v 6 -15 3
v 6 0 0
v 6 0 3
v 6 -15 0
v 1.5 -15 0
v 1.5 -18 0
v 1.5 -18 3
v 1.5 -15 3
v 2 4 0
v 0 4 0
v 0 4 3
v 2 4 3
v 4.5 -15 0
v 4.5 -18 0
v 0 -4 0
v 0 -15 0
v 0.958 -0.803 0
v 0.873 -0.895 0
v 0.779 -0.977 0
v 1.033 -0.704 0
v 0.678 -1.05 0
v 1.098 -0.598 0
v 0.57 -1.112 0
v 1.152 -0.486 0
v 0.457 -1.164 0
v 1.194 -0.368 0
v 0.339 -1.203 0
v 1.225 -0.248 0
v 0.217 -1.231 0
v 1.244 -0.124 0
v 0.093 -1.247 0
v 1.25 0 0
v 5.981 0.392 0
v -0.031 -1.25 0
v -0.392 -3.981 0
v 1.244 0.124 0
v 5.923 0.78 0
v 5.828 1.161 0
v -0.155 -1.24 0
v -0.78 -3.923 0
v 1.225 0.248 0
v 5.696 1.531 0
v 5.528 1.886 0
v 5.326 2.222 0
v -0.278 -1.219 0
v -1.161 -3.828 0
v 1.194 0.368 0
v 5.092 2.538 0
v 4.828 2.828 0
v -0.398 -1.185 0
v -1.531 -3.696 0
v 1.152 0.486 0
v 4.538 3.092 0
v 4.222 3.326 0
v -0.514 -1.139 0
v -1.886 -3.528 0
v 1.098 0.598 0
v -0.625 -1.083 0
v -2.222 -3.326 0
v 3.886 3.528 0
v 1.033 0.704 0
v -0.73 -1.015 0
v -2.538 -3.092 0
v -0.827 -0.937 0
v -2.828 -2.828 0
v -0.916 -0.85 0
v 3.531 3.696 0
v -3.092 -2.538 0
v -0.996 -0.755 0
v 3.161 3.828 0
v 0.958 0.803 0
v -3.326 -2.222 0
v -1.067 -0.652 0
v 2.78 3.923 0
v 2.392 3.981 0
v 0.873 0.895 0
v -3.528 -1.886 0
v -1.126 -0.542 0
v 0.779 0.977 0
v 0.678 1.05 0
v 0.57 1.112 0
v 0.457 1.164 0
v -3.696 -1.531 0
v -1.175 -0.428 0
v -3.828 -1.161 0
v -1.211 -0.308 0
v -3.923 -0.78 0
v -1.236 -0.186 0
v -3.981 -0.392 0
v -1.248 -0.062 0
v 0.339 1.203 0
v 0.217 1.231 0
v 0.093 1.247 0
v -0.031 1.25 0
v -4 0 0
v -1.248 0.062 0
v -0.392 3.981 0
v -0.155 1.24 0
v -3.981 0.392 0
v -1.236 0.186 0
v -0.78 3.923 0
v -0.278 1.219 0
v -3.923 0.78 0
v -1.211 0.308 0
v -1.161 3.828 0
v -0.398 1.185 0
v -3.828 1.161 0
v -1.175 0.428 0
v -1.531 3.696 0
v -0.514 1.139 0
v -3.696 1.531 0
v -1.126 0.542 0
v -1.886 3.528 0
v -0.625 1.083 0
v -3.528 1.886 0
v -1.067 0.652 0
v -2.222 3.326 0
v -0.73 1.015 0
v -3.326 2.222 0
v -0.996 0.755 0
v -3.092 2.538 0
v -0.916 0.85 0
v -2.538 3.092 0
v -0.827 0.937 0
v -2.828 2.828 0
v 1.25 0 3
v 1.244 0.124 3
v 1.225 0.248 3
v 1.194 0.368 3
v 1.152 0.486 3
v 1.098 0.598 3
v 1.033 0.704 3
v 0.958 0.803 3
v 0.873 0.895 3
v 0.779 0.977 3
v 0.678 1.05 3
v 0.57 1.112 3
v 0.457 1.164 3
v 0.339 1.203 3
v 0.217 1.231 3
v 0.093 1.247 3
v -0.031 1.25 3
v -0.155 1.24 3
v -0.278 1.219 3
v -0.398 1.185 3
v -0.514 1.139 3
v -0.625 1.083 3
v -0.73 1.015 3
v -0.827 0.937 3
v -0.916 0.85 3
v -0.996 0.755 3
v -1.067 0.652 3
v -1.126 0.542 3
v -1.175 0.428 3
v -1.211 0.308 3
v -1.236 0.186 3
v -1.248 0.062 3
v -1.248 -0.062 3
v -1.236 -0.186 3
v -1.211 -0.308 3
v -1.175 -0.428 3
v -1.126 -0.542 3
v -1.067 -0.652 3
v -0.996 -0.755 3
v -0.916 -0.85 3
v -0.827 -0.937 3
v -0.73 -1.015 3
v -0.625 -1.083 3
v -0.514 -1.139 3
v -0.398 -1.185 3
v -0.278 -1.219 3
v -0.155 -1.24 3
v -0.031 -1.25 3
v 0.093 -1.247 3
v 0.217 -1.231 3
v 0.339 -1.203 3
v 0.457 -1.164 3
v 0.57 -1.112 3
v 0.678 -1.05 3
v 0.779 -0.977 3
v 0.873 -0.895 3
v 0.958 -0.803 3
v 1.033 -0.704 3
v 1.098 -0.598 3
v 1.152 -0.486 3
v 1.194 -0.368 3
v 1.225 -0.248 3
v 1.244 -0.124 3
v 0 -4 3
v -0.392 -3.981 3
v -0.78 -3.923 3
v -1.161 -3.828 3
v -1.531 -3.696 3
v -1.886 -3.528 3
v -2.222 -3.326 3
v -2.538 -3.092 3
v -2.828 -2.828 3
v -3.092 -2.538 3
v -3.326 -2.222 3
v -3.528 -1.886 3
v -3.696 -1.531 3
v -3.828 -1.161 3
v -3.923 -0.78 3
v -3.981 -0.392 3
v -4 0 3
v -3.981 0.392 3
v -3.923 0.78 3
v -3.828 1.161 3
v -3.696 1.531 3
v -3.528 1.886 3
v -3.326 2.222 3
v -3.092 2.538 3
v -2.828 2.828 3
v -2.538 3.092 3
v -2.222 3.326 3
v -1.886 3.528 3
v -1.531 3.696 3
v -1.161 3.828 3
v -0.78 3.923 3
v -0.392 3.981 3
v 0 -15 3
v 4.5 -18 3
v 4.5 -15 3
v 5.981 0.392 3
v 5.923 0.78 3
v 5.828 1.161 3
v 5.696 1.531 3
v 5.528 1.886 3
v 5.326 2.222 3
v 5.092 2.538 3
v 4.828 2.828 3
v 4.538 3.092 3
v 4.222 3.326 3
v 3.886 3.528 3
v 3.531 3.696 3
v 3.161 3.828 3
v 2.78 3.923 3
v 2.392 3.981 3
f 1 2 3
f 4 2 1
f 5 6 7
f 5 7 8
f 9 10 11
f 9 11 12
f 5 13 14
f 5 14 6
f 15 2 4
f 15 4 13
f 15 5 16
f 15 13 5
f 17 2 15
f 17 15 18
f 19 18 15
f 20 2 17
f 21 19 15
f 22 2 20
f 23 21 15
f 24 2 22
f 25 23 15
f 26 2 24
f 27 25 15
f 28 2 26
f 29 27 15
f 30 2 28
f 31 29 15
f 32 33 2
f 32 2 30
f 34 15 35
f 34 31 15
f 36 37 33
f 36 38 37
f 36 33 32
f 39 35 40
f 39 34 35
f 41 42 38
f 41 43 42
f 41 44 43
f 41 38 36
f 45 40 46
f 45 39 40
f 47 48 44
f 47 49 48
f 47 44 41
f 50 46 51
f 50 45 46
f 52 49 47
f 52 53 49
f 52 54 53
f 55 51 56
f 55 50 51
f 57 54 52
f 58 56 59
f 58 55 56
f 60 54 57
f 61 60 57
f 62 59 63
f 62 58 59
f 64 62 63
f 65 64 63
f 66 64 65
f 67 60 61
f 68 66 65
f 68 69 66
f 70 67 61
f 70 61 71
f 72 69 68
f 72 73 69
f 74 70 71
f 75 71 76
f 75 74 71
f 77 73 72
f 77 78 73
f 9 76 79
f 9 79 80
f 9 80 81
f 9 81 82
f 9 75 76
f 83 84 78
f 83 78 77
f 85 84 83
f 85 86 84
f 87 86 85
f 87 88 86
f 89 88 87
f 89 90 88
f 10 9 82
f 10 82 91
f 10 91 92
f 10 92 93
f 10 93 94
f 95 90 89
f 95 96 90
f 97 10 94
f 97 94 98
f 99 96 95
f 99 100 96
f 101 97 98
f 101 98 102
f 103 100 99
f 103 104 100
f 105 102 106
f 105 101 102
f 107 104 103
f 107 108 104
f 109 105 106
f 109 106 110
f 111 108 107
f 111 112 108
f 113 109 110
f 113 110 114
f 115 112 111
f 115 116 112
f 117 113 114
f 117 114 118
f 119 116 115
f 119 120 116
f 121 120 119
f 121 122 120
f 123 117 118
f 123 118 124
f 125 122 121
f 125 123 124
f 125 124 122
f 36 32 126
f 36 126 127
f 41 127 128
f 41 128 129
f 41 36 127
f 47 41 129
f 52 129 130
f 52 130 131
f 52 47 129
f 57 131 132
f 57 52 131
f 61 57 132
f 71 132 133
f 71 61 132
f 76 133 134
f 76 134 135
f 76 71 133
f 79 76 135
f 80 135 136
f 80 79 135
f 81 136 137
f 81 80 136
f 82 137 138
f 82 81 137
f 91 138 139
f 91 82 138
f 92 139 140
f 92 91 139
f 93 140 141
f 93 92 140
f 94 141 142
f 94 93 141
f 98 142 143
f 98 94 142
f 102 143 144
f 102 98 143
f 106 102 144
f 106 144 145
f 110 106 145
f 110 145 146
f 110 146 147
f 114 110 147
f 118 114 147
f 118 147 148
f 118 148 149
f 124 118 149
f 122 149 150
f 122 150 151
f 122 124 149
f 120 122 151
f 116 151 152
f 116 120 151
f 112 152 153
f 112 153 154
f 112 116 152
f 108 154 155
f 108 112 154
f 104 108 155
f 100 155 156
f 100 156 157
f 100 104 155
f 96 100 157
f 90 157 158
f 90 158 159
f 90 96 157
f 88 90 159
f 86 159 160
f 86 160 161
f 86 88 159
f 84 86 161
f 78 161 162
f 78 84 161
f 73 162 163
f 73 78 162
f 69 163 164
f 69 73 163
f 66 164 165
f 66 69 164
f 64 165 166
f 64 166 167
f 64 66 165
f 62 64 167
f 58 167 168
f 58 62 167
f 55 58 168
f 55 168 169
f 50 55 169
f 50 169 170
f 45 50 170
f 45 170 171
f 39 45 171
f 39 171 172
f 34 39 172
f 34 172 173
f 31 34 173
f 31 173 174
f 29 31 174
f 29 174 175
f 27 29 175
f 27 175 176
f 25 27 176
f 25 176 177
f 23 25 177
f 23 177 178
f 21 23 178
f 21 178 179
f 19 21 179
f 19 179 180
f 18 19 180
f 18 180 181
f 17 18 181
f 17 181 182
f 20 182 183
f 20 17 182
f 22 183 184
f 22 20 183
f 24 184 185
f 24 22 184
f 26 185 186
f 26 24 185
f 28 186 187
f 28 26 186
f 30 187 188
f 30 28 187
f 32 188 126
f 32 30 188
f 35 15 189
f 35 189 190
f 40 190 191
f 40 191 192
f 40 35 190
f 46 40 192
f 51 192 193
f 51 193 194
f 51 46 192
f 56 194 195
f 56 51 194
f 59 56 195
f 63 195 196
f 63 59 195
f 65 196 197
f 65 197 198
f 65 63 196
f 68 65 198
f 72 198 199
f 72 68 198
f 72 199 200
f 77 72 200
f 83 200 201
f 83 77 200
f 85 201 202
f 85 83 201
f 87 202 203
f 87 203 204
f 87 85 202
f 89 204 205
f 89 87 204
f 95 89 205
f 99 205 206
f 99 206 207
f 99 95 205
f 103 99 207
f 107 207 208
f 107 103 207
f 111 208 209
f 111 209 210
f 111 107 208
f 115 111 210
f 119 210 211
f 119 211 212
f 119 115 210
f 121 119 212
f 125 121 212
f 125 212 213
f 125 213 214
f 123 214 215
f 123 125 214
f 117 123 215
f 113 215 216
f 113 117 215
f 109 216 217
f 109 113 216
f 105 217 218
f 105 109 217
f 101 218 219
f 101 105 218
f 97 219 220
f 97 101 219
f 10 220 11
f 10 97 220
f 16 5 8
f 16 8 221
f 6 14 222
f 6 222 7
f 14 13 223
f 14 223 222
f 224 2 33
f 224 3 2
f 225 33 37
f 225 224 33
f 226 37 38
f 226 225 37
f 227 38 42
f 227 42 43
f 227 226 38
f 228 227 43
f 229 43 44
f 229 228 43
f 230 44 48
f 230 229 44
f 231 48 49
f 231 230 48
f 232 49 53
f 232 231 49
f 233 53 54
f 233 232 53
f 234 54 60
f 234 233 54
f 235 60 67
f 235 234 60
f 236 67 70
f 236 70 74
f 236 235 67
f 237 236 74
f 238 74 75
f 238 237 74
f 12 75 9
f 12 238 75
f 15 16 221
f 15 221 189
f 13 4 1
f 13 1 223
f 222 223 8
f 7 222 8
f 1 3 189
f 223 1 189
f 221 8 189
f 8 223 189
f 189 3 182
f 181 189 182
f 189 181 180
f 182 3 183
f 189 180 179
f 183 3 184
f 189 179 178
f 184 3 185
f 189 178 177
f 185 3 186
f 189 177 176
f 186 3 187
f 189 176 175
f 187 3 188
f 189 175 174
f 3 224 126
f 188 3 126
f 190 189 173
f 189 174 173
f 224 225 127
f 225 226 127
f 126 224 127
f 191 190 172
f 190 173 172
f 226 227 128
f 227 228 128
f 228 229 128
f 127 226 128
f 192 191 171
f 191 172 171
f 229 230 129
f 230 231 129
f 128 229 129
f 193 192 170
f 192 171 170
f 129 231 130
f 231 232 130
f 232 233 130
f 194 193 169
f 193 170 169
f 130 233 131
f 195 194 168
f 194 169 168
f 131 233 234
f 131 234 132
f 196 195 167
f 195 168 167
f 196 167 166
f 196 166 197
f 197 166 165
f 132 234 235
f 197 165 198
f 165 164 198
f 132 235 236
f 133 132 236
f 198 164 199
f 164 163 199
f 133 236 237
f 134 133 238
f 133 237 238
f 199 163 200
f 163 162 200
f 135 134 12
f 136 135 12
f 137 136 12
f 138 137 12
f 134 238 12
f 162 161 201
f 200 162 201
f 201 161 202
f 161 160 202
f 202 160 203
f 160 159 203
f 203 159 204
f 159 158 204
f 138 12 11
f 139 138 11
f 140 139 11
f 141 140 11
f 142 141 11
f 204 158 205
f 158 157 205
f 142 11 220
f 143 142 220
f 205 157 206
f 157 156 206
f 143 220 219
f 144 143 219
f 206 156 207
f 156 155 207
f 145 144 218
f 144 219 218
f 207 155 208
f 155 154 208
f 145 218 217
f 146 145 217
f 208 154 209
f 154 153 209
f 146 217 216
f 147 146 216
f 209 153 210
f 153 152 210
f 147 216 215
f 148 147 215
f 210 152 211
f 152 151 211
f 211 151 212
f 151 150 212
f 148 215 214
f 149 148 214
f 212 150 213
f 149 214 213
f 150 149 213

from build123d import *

# Parameters (mm, degrees)
SKETCH2_R           = 1.25
BOSS_EXTRUDE1_DEPTH = 3
FILLET1_R           = 4


with BuildPart() as part:
    # Sketch2 → Boss-Extrude1 (new body)
    with BuildSketch(Plane.XY):
        with BuildLine():
            Line((6, 4), (6, -15))
            Line((6, -15), (4.5, -15))
            Line((4.5, -15), (4.5, -18))
            Line((4.5, -18), (1.5, -18))
            Line((1.5, -18), (1.5, -15))
            Line((1.5, -15), (0, -15))
            Line((0, -15), (0, -4))
            ThreePointArc((0, -4), (-4, 0), (0, 4))
            Line((0, 4), (6, 4))
        make_face()
        Circle(SKETCH2_R, mode=Mode.SUBTRACT)
    extrude(amount=BOSS_EXTRUDE1_DEPTH)

    # Fillet1
    fillet1_edges = [part.edges().sort_by_distance(p)[0] for p in [
        (6, 4, 1.5),
    ]]
    fillet(fillet1_edges, radius=FILLET1_R)


solid = part.part
